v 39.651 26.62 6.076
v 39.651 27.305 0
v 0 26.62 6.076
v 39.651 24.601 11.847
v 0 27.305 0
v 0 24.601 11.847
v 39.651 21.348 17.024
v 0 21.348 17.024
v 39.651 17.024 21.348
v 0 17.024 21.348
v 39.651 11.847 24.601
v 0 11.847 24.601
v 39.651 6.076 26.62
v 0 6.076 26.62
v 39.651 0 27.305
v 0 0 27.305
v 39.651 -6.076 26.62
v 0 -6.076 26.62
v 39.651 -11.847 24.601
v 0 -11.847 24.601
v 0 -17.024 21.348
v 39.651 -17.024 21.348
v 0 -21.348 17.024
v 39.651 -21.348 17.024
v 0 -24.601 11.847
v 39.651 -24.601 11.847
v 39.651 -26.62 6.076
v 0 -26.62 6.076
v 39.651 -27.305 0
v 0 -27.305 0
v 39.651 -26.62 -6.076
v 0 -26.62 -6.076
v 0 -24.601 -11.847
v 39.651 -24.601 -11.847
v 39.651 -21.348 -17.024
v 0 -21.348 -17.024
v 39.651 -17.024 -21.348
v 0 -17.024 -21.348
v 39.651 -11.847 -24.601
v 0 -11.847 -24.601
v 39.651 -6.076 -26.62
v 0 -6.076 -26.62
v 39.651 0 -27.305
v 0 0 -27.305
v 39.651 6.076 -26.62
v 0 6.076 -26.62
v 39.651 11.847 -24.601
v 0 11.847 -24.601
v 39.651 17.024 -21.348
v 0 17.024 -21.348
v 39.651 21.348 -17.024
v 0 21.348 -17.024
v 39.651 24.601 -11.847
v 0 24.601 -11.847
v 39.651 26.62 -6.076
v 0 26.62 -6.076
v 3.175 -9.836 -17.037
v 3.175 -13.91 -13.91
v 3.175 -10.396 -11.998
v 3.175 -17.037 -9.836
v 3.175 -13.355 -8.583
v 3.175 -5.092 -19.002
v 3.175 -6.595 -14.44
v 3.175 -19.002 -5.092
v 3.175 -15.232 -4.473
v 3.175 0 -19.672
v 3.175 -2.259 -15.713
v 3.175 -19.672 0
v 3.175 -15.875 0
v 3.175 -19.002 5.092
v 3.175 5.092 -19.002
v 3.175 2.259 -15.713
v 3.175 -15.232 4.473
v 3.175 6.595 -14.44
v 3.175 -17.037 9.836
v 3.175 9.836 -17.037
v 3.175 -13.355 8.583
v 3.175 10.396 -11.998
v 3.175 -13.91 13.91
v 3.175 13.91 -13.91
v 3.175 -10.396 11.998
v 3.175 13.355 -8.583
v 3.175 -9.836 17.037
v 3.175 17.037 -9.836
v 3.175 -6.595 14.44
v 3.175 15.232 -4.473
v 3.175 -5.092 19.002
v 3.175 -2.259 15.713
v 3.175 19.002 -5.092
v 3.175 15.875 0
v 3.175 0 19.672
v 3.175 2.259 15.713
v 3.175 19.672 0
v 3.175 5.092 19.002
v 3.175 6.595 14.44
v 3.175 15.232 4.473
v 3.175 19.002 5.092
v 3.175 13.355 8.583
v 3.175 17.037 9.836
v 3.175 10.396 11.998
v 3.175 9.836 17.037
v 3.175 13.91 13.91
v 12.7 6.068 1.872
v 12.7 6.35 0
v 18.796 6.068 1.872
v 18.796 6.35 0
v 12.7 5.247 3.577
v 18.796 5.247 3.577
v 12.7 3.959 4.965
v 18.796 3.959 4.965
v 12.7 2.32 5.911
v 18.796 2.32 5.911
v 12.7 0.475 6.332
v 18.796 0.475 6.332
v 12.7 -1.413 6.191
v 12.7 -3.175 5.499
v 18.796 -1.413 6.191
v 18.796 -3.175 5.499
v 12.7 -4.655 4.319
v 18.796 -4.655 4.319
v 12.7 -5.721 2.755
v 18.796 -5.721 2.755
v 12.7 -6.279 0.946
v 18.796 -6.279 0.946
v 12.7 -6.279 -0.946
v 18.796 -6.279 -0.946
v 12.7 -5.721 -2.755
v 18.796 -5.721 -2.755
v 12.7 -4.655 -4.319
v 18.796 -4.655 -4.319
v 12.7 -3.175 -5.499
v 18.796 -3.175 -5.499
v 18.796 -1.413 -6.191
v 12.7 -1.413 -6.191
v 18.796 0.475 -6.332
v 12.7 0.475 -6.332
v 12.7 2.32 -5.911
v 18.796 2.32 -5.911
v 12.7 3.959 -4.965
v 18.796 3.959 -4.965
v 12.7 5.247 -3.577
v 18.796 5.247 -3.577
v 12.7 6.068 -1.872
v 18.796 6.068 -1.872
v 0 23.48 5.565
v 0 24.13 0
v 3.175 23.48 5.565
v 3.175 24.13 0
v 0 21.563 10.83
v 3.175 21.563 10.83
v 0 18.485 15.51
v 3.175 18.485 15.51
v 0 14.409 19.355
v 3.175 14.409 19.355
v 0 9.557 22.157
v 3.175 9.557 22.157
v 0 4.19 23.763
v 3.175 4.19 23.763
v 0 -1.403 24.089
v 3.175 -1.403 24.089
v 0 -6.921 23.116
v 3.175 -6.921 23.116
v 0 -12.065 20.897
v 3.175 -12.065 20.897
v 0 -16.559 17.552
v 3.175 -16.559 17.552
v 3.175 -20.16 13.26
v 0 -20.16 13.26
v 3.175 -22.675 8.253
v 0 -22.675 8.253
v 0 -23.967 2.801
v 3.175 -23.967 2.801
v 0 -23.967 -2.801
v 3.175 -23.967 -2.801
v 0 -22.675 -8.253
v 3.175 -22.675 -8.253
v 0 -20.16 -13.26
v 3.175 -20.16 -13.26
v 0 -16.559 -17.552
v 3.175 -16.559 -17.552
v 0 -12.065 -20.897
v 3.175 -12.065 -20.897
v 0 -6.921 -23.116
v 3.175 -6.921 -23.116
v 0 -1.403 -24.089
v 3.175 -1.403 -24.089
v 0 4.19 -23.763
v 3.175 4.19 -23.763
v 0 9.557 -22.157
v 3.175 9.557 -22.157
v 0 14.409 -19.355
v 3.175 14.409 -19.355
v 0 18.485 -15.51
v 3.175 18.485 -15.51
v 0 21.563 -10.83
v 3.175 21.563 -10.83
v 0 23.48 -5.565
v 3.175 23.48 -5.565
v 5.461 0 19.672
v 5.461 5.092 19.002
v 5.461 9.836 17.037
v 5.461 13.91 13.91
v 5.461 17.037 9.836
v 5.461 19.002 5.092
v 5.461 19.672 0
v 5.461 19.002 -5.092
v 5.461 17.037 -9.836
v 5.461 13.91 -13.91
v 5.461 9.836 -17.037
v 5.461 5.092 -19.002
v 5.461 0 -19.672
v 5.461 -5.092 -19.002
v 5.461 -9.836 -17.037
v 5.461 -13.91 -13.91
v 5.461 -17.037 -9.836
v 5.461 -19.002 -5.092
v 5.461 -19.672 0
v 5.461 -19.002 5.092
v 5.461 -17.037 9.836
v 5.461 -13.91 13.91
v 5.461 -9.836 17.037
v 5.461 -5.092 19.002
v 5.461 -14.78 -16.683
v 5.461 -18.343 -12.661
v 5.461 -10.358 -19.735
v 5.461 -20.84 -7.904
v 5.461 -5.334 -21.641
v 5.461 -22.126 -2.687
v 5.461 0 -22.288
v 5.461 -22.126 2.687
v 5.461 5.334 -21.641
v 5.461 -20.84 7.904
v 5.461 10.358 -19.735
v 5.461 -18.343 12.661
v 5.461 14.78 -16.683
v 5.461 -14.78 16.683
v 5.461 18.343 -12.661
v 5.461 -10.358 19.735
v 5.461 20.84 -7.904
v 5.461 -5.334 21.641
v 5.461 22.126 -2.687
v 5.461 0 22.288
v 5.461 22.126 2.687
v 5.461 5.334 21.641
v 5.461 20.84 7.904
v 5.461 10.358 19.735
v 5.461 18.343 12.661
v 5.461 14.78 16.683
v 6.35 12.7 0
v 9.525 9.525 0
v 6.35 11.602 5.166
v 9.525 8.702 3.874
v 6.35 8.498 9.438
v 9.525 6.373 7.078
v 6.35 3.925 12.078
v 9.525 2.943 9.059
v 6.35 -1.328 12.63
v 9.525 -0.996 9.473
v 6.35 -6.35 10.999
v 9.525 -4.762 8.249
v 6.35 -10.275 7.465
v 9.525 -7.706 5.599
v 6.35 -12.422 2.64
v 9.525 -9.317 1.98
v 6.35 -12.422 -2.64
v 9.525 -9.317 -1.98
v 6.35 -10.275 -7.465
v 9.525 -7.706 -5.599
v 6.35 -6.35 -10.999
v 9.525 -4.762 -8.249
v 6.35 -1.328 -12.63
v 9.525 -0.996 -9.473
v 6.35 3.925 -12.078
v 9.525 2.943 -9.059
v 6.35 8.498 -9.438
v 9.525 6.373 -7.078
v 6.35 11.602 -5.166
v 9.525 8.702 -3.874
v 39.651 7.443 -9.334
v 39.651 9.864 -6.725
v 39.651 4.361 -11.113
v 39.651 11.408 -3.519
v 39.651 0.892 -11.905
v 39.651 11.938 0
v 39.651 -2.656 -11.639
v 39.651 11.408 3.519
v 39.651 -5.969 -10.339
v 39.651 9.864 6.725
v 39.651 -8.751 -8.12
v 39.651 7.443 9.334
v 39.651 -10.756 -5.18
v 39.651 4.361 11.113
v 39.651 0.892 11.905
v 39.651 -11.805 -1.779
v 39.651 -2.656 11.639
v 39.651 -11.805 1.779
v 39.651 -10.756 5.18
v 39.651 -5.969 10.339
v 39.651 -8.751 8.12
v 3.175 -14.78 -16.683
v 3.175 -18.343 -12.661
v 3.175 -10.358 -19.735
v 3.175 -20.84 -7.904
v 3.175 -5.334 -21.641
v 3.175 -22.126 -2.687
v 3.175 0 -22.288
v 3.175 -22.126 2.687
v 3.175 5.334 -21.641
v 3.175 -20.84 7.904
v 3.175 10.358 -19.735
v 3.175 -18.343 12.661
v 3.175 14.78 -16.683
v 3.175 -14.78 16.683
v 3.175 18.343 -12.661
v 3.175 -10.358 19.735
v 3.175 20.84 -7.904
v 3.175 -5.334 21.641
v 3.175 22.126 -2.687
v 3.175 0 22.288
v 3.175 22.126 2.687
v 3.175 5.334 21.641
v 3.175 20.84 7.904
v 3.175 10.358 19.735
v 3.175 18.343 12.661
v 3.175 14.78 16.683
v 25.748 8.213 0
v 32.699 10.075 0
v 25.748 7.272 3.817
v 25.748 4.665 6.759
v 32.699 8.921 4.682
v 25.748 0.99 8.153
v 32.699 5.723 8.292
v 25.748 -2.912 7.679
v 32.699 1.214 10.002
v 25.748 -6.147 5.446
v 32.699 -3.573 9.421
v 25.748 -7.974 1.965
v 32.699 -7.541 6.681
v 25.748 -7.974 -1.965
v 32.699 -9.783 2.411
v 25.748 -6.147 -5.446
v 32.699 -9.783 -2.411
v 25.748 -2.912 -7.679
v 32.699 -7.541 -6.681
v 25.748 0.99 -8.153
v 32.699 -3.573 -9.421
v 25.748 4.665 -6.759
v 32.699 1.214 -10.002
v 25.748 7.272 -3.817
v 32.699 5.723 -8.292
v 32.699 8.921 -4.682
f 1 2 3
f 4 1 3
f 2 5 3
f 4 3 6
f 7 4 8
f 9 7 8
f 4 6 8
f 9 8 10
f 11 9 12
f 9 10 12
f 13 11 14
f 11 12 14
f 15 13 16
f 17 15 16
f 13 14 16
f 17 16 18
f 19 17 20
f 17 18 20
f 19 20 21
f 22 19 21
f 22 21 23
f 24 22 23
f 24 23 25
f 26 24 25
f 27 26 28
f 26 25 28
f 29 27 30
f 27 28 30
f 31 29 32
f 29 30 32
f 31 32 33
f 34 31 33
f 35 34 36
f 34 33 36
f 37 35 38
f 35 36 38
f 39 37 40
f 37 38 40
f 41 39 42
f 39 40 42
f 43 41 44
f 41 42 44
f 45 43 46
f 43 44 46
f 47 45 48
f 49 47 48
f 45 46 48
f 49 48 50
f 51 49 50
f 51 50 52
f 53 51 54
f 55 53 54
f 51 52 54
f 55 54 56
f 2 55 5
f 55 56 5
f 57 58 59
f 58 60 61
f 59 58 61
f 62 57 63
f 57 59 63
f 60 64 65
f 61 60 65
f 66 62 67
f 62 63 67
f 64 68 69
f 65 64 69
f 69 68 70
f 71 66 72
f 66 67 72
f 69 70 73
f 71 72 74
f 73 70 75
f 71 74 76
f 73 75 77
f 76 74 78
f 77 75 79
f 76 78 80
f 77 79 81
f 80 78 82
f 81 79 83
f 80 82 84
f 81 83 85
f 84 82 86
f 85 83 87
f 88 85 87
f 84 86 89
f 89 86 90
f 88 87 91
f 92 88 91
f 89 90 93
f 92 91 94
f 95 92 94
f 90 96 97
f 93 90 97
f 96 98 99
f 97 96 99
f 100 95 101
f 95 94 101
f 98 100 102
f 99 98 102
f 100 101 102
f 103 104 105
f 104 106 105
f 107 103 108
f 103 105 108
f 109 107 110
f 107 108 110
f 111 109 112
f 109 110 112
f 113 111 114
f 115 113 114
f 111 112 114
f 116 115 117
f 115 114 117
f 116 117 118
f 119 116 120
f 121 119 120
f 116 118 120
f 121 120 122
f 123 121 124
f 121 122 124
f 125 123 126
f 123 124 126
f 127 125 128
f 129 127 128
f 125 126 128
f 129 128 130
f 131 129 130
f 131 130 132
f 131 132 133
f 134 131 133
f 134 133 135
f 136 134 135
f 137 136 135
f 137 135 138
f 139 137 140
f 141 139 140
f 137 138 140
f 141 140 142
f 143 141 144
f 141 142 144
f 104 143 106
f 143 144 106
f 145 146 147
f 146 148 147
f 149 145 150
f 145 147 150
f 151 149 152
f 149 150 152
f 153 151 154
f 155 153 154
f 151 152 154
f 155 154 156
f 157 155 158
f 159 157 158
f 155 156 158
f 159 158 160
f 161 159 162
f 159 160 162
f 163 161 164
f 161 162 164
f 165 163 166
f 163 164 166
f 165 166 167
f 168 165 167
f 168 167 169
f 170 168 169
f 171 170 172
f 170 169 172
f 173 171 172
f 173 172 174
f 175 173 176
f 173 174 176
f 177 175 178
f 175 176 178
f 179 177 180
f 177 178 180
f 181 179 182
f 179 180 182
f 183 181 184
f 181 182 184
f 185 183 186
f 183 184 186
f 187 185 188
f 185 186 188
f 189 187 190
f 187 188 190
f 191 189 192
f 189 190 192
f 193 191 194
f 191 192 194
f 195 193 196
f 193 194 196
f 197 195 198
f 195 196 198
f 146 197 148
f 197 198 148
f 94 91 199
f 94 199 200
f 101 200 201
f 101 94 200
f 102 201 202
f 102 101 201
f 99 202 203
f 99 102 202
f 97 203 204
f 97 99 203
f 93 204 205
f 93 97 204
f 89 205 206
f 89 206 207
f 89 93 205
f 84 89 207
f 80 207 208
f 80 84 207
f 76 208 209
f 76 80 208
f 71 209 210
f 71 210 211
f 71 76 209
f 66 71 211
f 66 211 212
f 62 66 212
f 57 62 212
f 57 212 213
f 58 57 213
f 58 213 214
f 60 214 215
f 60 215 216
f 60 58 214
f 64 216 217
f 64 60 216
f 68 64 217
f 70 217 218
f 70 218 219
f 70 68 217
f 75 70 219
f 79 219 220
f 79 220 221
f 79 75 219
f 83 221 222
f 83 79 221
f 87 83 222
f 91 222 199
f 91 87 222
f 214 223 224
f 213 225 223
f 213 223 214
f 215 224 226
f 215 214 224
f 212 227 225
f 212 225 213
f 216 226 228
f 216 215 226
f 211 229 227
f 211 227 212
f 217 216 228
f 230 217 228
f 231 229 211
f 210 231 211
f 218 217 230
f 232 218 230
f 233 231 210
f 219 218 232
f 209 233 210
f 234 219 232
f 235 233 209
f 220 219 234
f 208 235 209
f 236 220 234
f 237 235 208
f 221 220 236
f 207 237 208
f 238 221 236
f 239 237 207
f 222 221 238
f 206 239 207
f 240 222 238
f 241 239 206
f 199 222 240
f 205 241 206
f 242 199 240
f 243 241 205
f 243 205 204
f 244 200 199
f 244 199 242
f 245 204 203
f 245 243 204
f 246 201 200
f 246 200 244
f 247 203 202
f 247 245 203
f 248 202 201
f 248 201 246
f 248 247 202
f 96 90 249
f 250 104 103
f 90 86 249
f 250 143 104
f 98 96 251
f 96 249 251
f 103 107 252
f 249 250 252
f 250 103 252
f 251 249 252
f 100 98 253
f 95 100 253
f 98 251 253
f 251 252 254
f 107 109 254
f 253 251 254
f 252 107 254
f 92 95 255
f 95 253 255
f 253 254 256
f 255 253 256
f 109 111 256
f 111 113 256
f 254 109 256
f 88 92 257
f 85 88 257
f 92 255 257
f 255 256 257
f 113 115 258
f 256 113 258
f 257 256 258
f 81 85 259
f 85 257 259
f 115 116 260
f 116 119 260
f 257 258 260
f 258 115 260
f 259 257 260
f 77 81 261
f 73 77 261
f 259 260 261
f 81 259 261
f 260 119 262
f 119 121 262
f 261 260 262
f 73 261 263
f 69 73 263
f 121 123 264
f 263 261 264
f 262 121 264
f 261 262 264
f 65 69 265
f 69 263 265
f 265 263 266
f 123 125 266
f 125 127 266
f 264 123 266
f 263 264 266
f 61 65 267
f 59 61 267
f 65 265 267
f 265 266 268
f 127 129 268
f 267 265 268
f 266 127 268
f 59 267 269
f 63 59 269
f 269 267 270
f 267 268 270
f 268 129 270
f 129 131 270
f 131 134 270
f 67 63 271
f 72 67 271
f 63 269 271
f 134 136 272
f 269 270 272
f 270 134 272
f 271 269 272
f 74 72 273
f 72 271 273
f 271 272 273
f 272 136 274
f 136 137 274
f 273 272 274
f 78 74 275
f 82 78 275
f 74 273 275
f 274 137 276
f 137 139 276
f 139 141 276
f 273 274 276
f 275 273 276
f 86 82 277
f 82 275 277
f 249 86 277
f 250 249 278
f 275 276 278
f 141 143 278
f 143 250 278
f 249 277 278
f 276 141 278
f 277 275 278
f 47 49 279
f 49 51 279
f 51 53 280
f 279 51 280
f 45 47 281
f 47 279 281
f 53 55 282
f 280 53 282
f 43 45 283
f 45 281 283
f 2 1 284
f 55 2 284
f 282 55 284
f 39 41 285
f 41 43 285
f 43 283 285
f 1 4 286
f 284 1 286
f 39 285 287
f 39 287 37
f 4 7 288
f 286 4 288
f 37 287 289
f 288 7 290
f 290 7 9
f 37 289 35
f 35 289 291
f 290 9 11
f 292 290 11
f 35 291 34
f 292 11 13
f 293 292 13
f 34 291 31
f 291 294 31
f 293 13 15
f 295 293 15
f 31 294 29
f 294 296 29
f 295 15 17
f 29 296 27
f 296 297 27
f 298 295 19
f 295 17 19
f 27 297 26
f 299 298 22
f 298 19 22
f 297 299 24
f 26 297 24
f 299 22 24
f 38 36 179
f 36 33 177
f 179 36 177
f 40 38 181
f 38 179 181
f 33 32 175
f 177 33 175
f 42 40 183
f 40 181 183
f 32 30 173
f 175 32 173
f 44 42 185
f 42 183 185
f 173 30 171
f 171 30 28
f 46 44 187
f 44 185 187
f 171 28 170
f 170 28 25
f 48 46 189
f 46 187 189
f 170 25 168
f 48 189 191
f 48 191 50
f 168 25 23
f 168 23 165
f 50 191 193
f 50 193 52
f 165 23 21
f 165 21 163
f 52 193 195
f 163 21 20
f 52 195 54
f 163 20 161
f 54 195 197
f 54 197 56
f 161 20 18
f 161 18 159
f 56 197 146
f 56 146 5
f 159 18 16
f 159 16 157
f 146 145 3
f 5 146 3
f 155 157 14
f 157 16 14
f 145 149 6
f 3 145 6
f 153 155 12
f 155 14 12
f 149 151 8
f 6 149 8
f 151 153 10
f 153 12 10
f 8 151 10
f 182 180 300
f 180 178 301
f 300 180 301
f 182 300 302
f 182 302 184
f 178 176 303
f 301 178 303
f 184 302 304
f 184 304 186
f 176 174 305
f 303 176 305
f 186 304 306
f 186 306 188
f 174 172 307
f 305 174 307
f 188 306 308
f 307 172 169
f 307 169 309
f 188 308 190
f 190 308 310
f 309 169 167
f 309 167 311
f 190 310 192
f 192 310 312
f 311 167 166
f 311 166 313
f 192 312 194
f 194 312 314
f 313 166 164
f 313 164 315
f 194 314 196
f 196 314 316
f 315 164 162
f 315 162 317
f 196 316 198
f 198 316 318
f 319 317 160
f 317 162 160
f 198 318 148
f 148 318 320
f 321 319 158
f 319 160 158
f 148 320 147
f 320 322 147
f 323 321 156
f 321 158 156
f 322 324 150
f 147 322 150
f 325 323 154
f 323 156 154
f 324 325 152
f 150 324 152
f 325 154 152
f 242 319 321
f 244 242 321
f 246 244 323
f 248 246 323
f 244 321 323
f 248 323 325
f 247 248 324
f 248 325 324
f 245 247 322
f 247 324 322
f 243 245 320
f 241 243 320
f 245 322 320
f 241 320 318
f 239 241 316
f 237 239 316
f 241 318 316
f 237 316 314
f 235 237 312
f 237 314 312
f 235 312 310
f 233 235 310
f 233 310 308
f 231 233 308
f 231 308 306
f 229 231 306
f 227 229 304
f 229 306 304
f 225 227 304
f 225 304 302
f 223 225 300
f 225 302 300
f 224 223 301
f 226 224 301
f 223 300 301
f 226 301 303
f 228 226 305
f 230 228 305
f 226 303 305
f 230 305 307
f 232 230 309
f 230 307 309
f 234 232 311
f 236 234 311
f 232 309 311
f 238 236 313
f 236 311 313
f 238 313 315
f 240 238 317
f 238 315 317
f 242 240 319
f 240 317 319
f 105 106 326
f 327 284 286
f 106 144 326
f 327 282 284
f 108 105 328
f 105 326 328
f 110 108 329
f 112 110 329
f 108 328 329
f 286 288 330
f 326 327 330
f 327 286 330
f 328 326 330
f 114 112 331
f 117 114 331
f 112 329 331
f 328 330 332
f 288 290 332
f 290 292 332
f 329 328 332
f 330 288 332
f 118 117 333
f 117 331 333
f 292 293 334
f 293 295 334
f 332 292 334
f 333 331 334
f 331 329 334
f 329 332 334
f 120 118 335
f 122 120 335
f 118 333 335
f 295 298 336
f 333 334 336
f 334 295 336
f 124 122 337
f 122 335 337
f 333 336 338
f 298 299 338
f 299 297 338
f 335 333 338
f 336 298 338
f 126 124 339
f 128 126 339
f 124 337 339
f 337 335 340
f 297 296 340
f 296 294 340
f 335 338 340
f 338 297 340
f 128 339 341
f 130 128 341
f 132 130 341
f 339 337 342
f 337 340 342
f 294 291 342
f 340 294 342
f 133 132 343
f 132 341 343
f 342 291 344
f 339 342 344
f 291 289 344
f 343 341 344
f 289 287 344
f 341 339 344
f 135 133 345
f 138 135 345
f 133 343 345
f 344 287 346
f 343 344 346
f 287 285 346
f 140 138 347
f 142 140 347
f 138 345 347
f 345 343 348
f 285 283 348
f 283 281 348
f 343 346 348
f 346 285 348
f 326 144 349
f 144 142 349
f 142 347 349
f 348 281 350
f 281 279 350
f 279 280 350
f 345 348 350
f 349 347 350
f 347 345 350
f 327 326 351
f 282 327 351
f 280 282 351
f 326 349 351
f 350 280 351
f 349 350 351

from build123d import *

# Parameters (mm, degrees)
SKETCH2_R          = 22.2885
SKETCH2_R_2        = 19.6723
CUT_EXTRUDE1_DEPTH = 2.286


with BuildPart() as part:
    # Sketch1 → Revolve1 (revolve)
    with BuildSketch(Plane.XY):
        Polygon((0, 24.13), (3.175, 24.13), (3.175, 15.875), (12.7, 6.35), (18.796, 6.35), (39.650699913, 11.938), (39.650699913, 27.305), (0, 27.305), align=None)
    revolve(axis=Axis((0, 0, 0), (1, 0, 0)))

    # Sketch2 → Cut-Extrude1 (cut)
    with BuildSketch(Plane.ZY.offset(-3.175)):
        Circle(SKETCH2_R)
        Circle(SKETCH2_R_2, mode=Mode.SUBTRACT)
    extrude(amount=-CUT_EXTRUDE1_DEPTH, mode=Mode.SUBTRACT)


solid = part.part
